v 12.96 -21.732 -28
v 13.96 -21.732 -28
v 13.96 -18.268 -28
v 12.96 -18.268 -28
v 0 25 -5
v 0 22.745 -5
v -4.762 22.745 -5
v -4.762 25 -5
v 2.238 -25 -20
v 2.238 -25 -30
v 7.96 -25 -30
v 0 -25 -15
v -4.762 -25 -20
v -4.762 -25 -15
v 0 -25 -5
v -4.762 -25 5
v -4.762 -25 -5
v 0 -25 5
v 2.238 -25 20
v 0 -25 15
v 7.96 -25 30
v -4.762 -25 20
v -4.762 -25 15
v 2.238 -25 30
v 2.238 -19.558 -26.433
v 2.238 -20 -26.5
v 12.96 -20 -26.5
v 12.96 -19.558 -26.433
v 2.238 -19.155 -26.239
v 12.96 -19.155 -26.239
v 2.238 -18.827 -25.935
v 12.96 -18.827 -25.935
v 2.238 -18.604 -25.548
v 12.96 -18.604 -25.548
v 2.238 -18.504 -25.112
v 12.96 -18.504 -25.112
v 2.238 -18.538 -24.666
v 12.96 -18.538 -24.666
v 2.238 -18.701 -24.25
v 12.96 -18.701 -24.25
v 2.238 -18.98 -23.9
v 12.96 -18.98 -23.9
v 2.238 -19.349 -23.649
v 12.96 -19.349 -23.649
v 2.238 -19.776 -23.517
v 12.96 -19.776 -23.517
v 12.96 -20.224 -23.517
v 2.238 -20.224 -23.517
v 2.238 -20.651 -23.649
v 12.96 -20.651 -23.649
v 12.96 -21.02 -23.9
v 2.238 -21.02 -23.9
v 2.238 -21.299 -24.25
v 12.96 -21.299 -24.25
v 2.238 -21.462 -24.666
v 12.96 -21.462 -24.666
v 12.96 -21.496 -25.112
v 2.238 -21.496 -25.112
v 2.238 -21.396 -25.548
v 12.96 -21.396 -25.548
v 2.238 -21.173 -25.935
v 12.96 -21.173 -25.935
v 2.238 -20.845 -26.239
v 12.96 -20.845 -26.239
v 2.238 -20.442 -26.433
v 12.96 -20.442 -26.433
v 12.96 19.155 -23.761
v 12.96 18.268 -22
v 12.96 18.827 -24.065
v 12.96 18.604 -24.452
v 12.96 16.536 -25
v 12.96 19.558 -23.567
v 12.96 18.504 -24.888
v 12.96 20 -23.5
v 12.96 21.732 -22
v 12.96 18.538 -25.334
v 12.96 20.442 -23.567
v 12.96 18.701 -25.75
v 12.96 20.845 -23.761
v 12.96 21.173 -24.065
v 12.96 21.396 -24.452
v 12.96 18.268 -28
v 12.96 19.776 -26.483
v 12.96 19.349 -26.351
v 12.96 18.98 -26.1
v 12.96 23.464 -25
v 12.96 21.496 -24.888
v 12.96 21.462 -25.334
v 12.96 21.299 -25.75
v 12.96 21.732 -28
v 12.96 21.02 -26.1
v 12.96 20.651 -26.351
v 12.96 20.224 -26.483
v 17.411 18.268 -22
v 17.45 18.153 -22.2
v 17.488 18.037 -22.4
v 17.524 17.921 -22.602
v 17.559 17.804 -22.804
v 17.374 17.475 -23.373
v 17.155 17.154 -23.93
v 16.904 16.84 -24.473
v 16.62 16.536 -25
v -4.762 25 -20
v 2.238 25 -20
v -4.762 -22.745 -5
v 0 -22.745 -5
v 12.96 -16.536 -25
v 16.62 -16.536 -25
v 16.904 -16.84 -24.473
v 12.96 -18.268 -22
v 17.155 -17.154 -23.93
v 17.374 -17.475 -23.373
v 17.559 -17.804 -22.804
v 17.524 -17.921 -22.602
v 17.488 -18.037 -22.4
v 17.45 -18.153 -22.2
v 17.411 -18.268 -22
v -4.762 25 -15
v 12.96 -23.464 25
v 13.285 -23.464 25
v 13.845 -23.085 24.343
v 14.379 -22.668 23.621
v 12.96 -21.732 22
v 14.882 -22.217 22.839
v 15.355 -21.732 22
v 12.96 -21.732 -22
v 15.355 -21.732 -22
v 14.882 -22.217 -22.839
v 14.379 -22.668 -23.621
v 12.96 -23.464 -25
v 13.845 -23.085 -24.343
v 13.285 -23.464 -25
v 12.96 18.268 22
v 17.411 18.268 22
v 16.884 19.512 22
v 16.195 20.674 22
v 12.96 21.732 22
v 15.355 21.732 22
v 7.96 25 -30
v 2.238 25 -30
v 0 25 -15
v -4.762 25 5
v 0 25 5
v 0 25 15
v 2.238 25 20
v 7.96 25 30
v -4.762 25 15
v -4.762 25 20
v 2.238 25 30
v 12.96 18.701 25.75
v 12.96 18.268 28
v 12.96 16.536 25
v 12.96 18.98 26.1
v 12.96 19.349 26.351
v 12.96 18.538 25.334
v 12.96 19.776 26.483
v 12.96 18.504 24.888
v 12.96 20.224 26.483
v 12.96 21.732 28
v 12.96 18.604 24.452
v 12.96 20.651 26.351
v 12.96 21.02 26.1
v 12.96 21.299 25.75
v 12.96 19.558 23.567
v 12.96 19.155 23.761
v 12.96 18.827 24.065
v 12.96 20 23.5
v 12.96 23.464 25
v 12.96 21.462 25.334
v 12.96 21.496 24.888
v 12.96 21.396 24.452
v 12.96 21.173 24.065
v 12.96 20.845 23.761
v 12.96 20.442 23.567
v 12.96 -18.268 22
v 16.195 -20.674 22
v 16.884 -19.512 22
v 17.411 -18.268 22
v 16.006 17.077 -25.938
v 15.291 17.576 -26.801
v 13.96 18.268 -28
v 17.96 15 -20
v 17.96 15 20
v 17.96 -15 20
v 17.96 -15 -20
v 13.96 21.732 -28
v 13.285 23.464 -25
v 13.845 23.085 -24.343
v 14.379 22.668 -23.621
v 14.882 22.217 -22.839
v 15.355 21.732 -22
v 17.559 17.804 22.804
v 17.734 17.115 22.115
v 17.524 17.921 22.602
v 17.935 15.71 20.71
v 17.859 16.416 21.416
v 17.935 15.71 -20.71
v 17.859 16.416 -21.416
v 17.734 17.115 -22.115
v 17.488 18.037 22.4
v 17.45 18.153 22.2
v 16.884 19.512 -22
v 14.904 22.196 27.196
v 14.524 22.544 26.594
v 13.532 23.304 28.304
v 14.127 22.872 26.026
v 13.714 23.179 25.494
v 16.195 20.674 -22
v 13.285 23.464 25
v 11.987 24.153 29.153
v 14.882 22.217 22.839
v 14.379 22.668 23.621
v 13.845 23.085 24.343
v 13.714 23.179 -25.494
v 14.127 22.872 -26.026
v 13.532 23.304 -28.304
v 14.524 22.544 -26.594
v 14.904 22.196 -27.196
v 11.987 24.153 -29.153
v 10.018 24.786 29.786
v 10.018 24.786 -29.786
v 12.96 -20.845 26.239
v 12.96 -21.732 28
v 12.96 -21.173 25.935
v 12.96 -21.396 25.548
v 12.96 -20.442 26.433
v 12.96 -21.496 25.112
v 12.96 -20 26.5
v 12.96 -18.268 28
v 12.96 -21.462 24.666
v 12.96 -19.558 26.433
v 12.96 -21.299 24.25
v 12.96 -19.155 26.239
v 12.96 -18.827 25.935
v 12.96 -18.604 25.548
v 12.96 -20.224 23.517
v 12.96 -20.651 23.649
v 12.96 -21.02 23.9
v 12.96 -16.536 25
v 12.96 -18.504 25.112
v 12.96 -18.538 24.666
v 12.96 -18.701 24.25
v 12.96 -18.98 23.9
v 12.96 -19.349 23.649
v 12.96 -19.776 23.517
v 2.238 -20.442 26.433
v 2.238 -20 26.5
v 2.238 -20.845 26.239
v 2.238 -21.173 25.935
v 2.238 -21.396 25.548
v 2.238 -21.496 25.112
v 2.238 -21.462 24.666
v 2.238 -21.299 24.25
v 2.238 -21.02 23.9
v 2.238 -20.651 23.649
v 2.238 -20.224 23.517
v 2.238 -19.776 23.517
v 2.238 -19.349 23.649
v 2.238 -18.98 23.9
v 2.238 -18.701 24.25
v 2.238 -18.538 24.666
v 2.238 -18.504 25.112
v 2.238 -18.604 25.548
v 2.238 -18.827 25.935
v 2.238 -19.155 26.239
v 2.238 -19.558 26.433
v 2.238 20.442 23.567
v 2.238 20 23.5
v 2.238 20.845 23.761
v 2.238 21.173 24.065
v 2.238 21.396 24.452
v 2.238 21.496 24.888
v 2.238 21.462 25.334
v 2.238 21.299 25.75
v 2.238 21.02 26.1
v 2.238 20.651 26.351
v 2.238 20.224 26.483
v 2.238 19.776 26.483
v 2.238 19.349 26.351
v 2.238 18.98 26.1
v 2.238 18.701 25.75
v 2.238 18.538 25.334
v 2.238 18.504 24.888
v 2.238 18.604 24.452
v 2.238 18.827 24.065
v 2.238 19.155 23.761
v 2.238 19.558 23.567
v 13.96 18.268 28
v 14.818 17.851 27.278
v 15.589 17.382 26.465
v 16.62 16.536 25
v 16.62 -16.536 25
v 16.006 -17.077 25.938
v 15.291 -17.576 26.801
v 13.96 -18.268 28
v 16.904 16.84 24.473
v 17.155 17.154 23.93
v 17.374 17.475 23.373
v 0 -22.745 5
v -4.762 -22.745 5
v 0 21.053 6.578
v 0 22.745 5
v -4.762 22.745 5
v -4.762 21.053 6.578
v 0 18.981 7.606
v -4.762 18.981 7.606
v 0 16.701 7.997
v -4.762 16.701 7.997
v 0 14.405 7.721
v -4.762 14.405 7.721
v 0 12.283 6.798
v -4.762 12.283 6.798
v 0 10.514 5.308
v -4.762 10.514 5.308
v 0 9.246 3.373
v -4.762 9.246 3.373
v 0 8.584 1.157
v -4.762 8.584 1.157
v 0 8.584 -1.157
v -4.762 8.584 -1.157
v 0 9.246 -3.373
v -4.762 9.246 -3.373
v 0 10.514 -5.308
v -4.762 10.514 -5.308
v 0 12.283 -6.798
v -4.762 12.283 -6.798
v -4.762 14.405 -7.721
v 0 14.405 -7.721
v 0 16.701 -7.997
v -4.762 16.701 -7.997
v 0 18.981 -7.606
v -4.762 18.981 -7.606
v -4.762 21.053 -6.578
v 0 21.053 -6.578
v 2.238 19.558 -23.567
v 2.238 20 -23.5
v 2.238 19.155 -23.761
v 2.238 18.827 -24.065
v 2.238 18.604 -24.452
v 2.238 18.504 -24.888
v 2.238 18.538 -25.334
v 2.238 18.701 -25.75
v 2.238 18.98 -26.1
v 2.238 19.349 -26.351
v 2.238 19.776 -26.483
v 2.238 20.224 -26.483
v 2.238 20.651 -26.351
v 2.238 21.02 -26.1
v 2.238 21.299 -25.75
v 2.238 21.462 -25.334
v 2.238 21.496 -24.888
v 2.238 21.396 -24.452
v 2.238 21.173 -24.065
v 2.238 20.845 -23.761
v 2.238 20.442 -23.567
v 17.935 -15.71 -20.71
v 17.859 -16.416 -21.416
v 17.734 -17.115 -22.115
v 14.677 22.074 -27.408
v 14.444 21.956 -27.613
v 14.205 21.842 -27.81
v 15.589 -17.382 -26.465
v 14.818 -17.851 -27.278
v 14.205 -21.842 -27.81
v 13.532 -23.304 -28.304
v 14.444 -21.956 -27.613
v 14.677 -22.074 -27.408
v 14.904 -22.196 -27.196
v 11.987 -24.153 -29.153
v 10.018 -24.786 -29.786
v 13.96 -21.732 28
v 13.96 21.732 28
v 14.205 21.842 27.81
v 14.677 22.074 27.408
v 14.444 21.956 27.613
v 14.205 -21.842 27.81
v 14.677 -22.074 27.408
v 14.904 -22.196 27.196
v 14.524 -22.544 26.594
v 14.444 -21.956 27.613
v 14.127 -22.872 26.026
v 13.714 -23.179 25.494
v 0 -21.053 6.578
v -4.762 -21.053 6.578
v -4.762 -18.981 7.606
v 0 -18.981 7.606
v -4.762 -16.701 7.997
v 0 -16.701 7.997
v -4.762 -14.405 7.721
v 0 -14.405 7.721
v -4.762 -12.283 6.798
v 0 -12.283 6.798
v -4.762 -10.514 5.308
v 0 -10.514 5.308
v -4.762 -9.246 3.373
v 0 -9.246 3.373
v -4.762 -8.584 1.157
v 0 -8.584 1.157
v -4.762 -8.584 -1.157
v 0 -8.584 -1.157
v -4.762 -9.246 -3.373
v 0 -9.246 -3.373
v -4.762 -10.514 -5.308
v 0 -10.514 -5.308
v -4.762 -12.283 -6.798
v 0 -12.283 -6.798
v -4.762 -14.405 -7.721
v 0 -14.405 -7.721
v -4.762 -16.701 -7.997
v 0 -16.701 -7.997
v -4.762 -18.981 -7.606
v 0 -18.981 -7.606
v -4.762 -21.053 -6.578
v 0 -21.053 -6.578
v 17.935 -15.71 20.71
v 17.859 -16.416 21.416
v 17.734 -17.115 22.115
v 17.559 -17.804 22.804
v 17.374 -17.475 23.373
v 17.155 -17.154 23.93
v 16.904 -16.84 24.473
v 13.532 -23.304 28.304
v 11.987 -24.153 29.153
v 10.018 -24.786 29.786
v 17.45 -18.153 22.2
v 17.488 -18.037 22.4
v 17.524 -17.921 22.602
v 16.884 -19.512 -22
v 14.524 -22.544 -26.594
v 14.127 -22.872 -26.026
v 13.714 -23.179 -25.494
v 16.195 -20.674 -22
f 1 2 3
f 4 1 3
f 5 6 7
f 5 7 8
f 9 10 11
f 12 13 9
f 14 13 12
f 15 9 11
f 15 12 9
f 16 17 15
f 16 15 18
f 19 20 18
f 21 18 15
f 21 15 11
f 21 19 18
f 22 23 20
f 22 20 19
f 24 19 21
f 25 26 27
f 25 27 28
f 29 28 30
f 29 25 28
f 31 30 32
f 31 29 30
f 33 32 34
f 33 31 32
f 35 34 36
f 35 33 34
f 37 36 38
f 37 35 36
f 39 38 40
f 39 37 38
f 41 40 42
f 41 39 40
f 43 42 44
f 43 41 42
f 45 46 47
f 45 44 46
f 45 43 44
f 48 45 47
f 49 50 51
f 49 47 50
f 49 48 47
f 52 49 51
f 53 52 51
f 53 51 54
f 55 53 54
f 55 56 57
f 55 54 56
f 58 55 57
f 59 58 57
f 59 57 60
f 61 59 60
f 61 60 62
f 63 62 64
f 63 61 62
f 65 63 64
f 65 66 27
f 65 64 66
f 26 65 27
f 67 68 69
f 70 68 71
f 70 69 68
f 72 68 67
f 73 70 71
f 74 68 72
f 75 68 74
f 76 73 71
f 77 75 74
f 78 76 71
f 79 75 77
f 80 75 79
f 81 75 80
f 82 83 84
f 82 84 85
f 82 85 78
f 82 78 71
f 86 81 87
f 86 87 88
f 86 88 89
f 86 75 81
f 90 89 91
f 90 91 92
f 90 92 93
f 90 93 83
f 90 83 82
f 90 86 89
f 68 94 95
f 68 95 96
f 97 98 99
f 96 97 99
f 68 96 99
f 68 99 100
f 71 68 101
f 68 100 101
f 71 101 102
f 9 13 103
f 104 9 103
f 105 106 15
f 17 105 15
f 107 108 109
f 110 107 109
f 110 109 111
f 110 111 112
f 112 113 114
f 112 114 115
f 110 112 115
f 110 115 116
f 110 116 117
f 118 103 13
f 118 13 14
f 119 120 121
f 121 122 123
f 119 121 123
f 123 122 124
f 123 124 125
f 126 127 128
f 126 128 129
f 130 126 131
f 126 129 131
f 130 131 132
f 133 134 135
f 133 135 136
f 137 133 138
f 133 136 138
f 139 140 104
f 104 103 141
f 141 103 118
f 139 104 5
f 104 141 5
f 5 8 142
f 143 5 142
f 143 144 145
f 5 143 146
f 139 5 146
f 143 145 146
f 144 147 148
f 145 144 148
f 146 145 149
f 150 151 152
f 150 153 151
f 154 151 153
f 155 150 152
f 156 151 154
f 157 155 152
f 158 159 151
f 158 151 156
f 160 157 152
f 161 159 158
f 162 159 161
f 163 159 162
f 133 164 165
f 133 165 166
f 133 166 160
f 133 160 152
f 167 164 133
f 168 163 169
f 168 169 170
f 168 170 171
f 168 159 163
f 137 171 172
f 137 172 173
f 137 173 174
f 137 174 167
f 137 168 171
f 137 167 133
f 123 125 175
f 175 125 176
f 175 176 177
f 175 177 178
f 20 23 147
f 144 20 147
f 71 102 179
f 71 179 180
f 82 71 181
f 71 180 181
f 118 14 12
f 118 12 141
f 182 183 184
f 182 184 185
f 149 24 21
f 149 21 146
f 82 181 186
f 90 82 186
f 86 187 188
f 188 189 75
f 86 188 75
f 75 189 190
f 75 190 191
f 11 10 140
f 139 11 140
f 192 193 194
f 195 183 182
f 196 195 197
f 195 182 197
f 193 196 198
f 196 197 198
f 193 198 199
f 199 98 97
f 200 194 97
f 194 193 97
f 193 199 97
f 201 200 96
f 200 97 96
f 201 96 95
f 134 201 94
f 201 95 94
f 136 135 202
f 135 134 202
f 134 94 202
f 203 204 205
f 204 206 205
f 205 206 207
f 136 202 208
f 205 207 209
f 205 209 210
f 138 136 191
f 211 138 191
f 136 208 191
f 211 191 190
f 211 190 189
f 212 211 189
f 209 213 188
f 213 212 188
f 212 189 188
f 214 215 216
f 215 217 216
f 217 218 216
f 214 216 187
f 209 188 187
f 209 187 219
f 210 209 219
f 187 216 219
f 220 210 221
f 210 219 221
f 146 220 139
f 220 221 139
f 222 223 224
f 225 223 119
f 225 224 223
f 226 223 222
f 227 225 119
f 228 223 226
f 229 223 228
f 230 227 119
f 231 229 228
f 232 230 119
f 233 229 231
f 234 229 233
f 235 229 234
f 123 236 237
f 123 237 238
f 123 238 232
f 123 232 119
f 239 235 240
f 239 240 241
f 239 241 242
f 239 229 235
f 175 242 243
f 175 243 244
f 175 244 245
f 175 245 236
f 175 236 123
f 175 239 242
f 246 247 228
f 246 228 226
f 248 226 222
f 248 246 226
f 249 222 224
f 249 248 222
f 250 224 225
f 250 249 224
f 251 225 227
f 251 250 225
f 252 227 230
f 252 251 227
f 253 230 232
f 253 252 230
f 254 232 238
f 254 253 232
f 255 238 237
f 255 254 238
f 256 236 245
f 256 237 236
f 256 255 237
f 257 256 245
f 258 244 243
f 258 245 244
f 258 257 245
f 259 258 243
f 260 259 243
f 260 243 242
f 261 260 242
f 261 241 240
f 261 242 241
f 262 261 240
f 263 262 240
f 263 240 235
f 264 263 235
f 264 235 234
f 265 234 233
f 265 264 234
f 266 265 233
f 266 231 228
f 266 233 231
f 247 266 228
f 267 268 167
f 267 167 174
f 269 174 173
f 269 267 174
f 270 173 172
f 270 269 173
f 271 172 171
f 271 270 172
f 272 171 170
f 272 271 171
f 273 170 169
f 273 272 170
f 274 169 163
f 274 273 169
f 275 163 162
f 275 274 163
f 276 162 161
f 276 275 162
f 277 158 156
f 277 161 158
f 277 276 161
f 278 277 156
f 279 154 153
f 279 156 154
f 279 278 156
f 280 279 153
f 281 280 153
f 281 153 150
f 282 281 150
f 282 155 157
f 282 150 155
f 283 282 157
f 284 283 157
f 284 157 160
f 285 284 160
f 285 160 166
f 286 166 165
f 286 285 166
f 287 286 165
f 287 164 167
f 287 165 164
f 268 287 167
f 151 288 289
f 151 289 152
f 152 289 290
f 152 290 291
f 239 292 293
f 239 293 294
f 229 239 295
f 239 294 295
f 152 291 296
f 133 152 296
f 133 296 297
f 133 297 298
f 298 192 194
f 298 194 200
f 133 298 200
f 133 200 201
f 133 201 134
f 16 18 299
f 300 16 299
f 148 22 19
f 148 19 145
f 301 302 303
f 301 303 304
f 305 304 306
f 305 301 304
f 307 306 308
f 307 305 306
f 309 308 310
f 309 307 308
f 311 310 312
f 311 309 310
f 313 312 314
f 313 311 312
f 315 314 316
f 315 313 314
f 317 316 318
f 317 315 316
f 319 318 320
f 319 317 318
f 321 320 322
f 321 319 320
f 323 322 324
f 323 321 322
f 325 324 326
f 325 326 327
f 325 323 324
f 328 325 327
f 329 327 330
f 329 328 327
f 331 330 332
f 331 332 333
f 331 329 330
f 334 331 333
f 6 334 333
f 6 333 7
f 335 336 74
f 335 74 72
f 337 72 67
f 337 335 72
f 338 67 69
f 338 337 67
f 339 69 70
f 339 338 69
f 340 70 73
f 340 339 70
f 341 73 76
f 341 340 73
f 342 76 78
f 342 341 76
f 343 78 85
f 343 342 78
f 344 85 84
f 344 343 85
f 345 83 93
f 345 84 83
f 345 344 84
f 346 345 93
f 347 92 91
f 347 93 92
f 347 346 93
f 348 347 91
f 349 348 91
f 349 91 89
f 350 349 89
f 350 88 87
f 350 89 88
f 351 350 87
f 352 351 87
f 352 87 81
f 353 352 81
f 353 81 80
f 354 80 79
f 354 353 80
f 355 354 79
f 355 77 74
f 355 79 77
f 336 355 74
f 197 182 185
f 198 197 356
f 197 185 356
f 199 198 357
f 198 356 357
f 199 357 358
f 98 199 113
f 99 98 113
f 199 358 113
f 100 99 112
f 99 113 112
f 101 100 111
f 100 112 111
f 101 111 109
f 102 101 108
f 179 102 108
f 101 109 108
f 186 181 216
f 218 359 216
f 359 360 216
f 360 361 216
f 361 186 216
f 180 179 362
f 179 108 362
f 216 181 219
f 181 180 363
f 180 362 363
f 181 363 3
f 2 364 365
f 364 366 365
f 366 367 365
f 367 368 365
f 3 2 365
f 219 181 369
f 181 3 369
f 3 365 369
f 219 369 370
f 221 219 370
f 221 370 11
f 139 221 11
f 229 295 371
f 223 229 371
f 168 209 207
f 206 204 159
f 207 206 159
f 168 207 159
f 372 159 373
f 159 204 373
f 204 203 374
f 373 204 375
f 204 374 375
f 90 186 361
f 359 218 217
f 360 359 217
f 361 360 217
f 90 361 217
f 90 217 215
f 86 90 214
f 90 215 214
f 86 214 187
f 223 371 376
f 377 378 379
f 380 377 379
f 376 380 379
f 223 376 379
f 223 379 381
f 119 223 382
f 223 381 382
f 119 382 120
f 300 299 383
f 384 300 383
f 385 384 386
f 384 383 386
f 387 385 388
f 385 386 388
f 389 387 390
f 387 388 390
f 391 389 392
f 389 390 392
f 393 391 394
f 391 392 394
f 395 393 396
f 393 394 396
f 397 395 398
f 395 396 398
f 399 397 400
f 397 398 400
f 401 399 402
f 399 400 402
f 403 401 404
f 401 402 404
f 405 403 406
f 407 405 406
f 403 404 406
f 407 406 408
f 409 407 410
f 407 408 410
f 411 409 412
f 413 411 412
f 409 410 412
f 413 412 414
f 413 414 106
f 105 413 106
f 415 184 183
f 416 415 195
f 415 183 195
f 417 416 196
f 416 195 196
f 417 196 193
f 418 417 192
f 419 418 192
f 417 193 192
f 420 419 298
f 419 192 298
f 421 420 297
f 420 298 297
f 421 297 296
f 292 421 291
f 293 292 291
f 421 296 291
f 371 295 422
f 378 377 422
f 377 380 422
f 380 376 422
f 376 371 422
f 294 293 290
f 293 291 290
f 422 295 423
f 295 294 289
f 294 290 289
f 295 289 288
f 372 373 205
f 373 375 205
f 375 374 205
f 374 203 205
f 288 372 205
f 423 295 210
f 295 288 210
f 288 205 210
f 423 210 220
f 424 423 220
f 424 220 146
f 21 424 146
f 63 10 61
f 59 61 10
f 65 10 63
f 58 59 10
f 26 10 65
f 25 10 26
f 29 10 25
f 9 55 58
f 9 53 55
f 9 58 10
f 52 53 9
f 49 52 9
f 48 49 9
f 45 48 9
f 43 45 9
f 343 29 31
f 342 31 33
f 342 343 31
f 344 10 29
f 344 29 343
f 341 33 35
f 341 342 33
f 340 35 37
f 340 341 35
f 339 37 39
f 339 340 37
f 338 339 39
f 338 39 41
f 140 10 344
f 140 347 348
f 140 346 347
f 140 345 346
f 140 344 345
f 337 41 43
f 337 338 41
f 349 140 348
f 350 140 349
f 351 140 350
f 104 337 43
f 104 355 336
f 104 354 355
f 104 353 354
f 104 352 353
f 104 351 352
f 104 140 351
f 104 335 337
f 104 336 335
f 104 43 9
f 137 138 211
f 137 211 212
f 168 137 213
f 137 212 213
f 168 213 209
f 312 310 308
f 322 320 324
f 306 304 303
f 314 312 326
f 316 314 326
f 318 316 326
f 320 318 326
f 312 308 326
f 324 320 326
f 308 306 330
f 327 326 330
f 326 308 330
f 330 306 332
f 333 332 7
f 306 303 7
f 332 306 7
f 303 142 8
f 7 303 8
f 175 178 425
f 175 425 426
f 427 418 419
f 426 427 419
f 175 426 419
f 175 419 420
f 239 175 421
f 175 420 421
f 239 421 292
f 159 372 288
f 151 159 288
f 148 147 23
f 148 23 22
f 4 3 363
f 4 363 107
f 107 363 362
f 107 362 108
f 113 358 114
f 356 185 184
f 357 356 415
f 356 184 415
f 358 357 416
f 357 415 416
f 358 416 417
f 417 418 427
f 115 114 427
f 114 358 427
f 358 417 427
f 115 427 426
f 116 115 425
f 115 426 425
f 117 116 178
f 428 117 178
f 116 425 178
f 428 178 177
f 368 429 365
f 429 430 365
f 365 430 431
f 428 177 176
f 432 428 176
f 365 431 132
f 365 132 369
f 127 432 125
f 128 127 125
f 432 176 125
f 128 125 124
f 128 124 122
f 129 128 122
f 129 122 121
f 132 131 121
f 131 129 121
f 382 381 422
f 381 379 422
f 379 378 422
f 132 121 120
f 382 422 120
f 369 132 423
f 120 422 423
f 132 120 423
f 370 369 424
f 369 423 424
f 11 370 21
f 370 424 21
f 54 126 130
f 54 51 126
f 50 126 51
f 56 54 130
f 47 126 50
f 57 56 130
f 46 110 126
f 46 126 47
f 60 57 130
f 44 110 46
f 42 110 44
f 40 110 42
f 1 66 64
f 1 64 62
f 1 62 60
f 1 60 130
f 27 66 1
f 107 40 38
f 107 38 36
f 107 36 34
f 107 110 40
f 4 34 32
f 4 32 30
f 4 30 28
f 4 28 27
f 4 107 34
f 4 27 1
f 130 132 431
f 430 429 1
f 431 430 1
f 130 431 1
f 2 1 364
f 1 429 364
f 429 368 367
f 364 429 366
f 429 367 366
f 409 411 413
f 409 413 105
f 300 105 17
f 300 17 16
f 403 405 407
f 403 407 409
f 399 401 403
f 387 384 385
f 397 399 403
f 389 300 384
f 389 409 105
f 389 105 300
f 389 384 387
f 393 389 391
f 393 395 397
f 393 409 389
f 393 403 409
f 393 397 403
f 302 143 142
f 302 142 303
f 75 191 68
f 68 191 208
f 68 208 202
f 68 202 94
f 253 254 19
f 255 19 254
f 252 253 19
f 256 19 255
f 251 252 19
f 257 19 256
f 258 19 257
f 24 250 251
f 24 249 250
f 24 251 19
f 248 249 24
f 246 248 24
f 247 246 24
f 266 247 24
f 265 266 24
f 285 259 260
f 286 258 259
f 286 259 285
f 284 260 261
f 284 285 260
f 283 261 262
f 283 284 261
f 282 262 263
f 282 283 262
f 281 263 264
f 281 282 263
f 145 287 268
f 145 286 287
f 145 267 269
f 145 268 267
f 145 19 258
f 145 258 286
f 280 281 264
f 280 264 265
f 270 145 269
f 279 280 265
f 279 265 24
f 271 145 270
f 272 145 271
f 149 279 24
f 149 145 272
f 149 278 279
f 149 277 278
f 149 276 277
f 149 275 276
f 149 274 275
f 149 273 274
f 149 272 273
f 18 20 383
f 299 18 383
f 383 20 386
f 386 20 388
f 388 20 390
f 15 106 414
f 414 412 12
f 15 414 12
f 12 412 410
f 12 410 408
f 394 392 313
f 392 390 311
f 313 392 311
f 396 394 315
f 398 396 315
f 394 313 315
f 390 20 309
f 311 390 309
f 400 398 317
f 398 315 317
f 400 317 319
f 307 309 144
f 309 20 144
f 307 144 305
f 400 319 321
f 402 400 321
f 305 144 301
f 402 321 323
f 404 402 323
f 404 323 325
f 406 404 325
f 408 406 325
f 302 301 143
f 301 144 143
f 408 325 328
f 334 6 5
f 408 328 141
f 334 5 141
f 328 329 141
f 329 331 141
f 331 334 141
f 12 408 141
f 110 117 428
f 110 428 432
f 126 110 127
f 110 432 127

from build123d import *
from build123d.topology import SkipClean

# Parameters (mm, degrees)
CROQUIS1_W              = 60
CROQUIS1_H              = 50
CROQUIS1_R              = 1.5
SALIENTE_EXTRUIR1_DEPTH = 17.96
SALIENTE_EXTRUIR2_START = 4.7625
CROQUIS3_W              = 15
CROQUIS3_H              = 50
CROQUIS3_R              = 1.5
SALIENTE_EXTRUIR2_DEPTH = 4.7625
SALIENTE_EXTRUIR3_DEPTH = 4.7625
REDONDEO2_R             = 10
CORTAR_EXTRUIR1_DEPTH   = 5
CROQUIS6_W              = 10
CROQUIS6_H              = 50
CORTAR_EXTRUIR2_DEPTH   = 7


with BuildPart() as part:
    # Croquis1 → Saliente-Extruir1 (new body)
    with BuildSketch(Plane(origin=(0, 0, 0), x_dir=(0, 0, -1), z_dir=(1, 0, 0))):
        Rectangle(CROQUIS1_W, CROQUIS1_H)
        with Locations((-25, 20)):
            Circle(CROQUIS1_R, mode=Mode.SUBTRACT)
        with Locations(Location((25, 20, 0), (0, 0, 180))):
            Circle(CROQUIS1_R, mode=Mode.SUBTRACT)
        with Locations((25, -20)):
            Circle(CROQUIS1_R, mode=Mode.SUBTRACT)
        with Locations(Location((-25, -20, 0), (0, 0, 180))):
            Circle(CROQUIS1_R, mode=Mode.SUBTRACT)
    extrude(amount=SALIENTE_EXTRUIR1_DEPTH)

    # Croquis3 → Saliente-Extruir2 (add)
    # profile 1 of 2: a face of its own
    with SkipClean():  # the faces are left unmerged after this step: merging them gives an invalid solid
        with BuildSketch(Plane.ZY.offset(SALIENTE_EXTRUIR2_START)):
            with Locations((-22.5, 0)):
                Rectangle(CROQUIS3_W, CROQUIS3_H)
            with Locations((-25, -20)):
                Circle(CROQUIS3_R, mode=Mode.SUBTRACT)
            with Locations((-25, 20)):
                Circle(CROQUIS3_R, mode=Mode.SUBTRACT)
        # profile 2 of 2: a face of its own
        with BuildSketch(Plane.ZY.offset(SALIENTE_EXTRUIR2_START)):
            with Locations((22.5, 0)):
                Rectangle(CROQUIS3_W, CROQUIS3_H)
            with Locations((25, -20)):
                Circle(CROQUIS3_R, mode=Mode.SUBTRACT)
            with Locations((25, 20)):
                Circle(CROQUIS3_R, mode=Mode.SUBTRACT)
        extrude(amount=-SALIENTE_EXTRUIR2_DEPTH)

    # Croquis4 → Saliente-Extruir3 (add)
    with SkipClean():  # the faces are left unmerged after this step: merging them gives an invalid solid
        with BuildSketch(Plane.ZY):
            with BuildLine():
                Line((-5, 22.744997998), (-5, 25))
                Line((-5, 25), (5, 25))
                Line((5, 25), (5, 22.744997998))
                ThreePointArc((5, 22.744997998), (0, 8.5), (-5, 22.744997998))
            make_face()
            with BuildLine():
                Line((-5, -22.744997998), (-5, -25))
                Line((-5, -25), (5, -25))
                Line((5, -25), (5, -22.744997998))
                ThreePointArc((5, -22.744997998), (0, -8.5), (-5, -22.744997998))
            make_face()
        extrude(amount=SALIENTE_EXTRUIR3_DEPTH)

    # Redondeo2
    # the kernel refuses this fillet: 10 mm, written as the material it takes off along each edge
    with BuildSketch(Plane(origin=(17.96, -50, -30), x_dir=(-1, 0, 0), z_dir=(0, 1, 0)), Plane(origin=(17.96, 50, 30), x_dir=(-1, 0, 0), z_dir=(0, -1, 0))) as redondeo2_piece_1:
        with BuildLine():
            CenterArc((REDONDEO2_R, REDONDEO2_R), REDONDEO2_R, 180, 90)
            Line((0, REDONDEO2_R), (0, 0))
            Line((0, 0), (REDONDEO2_R, 0))
        make_face()
    extrude(amount=100, mode=Mode.SUBTRACT)
    with BuildSketch(Plane(origin=(17.96, 25, -55), x_dir=(0, -1, 0), z_dir=(0, 0, 1))) as redondeo2_piece_2:
        with BuildLine():
            CenterArc((REDONDEO2_R, -REDONDEO2_R), REDONDEO2_R, 90, 90)
            Line((0, -REDONDEO2_R), (0, 0))
            Line((0, 0), (REDONDEO2_R, 0))
        make_face()
    extrude(amount=110, mode=Mode.SUBTRACT)
    with BuildSketch(Plane(origin=(17.96, -25, 55), x_dir=(-1, 0, 0), z_dir=(0, 0, -1))) as redondeo2_piece_3:
        with BuildLine():
            CenterArc((REDONDEO2_R, REDONDEO2_R), REDONDEO2_R, 180, 90)
            Line((0, REDONDEO2_R), (0, 0))
            Line((0, 0), (REDONDEO2_R, 0))
        make_face()
    extrude(amount=110, mode=Mode.SUBTRACT)

    # Croquis5 → Cortar-Extruir1 (cut)
    with BuildSketch(Plane(origin=(17.96, 0, 0), x_dir=(0, 0, -1), z_dir=(1, 0, 0))):
        Polygon((-25, 23.464101615), (-28, 21.732050808), (-28, 18.267949192), (-25, 16.535898385), (-22, 18.267949192), (-22, 21.732050808), align=None)
        Polygon((25, 23.464101615), (22, 21.732050808), (22, 18.267949192), (25, 16.535898385), (28, 18.267949192), (28, 21.732050808), align=None)
        Polygon((25, -16.535898385), (22, -18.267949192), (22, -21.732050808), (25, -23.464101615), (28, -21.732050808), (28, -18.267949192), align=None)
        Polygon((-25, -16.535898385), (-28, -18.267949192), (-28, -21.732050808), (-25, -23.464101615), (-22, -21.732050808), (-22, -18.267949192), align=None)
    extrude(amount=-CORTAR_EXTRUIR1_DEPTH, mode=Mode.SUBTRACT)

    # Croquis6 → Cortar-Extruir2 (cut)
    with BuildSketch(Plane.ZY.offset(4.7625)):
        with Locations((25, 0)):
            Rectangle(CROQUIS6_W, CROQUIS6_H)
        with Locations((-25, 0)):
            Rectangle(CROQUIS6_W, CROQUIS6_H)
    extrude(amount=-CORTAR_EXTRUIR2_DEPTH, mode=Mode.SUBTRACT)


solid = part.part
